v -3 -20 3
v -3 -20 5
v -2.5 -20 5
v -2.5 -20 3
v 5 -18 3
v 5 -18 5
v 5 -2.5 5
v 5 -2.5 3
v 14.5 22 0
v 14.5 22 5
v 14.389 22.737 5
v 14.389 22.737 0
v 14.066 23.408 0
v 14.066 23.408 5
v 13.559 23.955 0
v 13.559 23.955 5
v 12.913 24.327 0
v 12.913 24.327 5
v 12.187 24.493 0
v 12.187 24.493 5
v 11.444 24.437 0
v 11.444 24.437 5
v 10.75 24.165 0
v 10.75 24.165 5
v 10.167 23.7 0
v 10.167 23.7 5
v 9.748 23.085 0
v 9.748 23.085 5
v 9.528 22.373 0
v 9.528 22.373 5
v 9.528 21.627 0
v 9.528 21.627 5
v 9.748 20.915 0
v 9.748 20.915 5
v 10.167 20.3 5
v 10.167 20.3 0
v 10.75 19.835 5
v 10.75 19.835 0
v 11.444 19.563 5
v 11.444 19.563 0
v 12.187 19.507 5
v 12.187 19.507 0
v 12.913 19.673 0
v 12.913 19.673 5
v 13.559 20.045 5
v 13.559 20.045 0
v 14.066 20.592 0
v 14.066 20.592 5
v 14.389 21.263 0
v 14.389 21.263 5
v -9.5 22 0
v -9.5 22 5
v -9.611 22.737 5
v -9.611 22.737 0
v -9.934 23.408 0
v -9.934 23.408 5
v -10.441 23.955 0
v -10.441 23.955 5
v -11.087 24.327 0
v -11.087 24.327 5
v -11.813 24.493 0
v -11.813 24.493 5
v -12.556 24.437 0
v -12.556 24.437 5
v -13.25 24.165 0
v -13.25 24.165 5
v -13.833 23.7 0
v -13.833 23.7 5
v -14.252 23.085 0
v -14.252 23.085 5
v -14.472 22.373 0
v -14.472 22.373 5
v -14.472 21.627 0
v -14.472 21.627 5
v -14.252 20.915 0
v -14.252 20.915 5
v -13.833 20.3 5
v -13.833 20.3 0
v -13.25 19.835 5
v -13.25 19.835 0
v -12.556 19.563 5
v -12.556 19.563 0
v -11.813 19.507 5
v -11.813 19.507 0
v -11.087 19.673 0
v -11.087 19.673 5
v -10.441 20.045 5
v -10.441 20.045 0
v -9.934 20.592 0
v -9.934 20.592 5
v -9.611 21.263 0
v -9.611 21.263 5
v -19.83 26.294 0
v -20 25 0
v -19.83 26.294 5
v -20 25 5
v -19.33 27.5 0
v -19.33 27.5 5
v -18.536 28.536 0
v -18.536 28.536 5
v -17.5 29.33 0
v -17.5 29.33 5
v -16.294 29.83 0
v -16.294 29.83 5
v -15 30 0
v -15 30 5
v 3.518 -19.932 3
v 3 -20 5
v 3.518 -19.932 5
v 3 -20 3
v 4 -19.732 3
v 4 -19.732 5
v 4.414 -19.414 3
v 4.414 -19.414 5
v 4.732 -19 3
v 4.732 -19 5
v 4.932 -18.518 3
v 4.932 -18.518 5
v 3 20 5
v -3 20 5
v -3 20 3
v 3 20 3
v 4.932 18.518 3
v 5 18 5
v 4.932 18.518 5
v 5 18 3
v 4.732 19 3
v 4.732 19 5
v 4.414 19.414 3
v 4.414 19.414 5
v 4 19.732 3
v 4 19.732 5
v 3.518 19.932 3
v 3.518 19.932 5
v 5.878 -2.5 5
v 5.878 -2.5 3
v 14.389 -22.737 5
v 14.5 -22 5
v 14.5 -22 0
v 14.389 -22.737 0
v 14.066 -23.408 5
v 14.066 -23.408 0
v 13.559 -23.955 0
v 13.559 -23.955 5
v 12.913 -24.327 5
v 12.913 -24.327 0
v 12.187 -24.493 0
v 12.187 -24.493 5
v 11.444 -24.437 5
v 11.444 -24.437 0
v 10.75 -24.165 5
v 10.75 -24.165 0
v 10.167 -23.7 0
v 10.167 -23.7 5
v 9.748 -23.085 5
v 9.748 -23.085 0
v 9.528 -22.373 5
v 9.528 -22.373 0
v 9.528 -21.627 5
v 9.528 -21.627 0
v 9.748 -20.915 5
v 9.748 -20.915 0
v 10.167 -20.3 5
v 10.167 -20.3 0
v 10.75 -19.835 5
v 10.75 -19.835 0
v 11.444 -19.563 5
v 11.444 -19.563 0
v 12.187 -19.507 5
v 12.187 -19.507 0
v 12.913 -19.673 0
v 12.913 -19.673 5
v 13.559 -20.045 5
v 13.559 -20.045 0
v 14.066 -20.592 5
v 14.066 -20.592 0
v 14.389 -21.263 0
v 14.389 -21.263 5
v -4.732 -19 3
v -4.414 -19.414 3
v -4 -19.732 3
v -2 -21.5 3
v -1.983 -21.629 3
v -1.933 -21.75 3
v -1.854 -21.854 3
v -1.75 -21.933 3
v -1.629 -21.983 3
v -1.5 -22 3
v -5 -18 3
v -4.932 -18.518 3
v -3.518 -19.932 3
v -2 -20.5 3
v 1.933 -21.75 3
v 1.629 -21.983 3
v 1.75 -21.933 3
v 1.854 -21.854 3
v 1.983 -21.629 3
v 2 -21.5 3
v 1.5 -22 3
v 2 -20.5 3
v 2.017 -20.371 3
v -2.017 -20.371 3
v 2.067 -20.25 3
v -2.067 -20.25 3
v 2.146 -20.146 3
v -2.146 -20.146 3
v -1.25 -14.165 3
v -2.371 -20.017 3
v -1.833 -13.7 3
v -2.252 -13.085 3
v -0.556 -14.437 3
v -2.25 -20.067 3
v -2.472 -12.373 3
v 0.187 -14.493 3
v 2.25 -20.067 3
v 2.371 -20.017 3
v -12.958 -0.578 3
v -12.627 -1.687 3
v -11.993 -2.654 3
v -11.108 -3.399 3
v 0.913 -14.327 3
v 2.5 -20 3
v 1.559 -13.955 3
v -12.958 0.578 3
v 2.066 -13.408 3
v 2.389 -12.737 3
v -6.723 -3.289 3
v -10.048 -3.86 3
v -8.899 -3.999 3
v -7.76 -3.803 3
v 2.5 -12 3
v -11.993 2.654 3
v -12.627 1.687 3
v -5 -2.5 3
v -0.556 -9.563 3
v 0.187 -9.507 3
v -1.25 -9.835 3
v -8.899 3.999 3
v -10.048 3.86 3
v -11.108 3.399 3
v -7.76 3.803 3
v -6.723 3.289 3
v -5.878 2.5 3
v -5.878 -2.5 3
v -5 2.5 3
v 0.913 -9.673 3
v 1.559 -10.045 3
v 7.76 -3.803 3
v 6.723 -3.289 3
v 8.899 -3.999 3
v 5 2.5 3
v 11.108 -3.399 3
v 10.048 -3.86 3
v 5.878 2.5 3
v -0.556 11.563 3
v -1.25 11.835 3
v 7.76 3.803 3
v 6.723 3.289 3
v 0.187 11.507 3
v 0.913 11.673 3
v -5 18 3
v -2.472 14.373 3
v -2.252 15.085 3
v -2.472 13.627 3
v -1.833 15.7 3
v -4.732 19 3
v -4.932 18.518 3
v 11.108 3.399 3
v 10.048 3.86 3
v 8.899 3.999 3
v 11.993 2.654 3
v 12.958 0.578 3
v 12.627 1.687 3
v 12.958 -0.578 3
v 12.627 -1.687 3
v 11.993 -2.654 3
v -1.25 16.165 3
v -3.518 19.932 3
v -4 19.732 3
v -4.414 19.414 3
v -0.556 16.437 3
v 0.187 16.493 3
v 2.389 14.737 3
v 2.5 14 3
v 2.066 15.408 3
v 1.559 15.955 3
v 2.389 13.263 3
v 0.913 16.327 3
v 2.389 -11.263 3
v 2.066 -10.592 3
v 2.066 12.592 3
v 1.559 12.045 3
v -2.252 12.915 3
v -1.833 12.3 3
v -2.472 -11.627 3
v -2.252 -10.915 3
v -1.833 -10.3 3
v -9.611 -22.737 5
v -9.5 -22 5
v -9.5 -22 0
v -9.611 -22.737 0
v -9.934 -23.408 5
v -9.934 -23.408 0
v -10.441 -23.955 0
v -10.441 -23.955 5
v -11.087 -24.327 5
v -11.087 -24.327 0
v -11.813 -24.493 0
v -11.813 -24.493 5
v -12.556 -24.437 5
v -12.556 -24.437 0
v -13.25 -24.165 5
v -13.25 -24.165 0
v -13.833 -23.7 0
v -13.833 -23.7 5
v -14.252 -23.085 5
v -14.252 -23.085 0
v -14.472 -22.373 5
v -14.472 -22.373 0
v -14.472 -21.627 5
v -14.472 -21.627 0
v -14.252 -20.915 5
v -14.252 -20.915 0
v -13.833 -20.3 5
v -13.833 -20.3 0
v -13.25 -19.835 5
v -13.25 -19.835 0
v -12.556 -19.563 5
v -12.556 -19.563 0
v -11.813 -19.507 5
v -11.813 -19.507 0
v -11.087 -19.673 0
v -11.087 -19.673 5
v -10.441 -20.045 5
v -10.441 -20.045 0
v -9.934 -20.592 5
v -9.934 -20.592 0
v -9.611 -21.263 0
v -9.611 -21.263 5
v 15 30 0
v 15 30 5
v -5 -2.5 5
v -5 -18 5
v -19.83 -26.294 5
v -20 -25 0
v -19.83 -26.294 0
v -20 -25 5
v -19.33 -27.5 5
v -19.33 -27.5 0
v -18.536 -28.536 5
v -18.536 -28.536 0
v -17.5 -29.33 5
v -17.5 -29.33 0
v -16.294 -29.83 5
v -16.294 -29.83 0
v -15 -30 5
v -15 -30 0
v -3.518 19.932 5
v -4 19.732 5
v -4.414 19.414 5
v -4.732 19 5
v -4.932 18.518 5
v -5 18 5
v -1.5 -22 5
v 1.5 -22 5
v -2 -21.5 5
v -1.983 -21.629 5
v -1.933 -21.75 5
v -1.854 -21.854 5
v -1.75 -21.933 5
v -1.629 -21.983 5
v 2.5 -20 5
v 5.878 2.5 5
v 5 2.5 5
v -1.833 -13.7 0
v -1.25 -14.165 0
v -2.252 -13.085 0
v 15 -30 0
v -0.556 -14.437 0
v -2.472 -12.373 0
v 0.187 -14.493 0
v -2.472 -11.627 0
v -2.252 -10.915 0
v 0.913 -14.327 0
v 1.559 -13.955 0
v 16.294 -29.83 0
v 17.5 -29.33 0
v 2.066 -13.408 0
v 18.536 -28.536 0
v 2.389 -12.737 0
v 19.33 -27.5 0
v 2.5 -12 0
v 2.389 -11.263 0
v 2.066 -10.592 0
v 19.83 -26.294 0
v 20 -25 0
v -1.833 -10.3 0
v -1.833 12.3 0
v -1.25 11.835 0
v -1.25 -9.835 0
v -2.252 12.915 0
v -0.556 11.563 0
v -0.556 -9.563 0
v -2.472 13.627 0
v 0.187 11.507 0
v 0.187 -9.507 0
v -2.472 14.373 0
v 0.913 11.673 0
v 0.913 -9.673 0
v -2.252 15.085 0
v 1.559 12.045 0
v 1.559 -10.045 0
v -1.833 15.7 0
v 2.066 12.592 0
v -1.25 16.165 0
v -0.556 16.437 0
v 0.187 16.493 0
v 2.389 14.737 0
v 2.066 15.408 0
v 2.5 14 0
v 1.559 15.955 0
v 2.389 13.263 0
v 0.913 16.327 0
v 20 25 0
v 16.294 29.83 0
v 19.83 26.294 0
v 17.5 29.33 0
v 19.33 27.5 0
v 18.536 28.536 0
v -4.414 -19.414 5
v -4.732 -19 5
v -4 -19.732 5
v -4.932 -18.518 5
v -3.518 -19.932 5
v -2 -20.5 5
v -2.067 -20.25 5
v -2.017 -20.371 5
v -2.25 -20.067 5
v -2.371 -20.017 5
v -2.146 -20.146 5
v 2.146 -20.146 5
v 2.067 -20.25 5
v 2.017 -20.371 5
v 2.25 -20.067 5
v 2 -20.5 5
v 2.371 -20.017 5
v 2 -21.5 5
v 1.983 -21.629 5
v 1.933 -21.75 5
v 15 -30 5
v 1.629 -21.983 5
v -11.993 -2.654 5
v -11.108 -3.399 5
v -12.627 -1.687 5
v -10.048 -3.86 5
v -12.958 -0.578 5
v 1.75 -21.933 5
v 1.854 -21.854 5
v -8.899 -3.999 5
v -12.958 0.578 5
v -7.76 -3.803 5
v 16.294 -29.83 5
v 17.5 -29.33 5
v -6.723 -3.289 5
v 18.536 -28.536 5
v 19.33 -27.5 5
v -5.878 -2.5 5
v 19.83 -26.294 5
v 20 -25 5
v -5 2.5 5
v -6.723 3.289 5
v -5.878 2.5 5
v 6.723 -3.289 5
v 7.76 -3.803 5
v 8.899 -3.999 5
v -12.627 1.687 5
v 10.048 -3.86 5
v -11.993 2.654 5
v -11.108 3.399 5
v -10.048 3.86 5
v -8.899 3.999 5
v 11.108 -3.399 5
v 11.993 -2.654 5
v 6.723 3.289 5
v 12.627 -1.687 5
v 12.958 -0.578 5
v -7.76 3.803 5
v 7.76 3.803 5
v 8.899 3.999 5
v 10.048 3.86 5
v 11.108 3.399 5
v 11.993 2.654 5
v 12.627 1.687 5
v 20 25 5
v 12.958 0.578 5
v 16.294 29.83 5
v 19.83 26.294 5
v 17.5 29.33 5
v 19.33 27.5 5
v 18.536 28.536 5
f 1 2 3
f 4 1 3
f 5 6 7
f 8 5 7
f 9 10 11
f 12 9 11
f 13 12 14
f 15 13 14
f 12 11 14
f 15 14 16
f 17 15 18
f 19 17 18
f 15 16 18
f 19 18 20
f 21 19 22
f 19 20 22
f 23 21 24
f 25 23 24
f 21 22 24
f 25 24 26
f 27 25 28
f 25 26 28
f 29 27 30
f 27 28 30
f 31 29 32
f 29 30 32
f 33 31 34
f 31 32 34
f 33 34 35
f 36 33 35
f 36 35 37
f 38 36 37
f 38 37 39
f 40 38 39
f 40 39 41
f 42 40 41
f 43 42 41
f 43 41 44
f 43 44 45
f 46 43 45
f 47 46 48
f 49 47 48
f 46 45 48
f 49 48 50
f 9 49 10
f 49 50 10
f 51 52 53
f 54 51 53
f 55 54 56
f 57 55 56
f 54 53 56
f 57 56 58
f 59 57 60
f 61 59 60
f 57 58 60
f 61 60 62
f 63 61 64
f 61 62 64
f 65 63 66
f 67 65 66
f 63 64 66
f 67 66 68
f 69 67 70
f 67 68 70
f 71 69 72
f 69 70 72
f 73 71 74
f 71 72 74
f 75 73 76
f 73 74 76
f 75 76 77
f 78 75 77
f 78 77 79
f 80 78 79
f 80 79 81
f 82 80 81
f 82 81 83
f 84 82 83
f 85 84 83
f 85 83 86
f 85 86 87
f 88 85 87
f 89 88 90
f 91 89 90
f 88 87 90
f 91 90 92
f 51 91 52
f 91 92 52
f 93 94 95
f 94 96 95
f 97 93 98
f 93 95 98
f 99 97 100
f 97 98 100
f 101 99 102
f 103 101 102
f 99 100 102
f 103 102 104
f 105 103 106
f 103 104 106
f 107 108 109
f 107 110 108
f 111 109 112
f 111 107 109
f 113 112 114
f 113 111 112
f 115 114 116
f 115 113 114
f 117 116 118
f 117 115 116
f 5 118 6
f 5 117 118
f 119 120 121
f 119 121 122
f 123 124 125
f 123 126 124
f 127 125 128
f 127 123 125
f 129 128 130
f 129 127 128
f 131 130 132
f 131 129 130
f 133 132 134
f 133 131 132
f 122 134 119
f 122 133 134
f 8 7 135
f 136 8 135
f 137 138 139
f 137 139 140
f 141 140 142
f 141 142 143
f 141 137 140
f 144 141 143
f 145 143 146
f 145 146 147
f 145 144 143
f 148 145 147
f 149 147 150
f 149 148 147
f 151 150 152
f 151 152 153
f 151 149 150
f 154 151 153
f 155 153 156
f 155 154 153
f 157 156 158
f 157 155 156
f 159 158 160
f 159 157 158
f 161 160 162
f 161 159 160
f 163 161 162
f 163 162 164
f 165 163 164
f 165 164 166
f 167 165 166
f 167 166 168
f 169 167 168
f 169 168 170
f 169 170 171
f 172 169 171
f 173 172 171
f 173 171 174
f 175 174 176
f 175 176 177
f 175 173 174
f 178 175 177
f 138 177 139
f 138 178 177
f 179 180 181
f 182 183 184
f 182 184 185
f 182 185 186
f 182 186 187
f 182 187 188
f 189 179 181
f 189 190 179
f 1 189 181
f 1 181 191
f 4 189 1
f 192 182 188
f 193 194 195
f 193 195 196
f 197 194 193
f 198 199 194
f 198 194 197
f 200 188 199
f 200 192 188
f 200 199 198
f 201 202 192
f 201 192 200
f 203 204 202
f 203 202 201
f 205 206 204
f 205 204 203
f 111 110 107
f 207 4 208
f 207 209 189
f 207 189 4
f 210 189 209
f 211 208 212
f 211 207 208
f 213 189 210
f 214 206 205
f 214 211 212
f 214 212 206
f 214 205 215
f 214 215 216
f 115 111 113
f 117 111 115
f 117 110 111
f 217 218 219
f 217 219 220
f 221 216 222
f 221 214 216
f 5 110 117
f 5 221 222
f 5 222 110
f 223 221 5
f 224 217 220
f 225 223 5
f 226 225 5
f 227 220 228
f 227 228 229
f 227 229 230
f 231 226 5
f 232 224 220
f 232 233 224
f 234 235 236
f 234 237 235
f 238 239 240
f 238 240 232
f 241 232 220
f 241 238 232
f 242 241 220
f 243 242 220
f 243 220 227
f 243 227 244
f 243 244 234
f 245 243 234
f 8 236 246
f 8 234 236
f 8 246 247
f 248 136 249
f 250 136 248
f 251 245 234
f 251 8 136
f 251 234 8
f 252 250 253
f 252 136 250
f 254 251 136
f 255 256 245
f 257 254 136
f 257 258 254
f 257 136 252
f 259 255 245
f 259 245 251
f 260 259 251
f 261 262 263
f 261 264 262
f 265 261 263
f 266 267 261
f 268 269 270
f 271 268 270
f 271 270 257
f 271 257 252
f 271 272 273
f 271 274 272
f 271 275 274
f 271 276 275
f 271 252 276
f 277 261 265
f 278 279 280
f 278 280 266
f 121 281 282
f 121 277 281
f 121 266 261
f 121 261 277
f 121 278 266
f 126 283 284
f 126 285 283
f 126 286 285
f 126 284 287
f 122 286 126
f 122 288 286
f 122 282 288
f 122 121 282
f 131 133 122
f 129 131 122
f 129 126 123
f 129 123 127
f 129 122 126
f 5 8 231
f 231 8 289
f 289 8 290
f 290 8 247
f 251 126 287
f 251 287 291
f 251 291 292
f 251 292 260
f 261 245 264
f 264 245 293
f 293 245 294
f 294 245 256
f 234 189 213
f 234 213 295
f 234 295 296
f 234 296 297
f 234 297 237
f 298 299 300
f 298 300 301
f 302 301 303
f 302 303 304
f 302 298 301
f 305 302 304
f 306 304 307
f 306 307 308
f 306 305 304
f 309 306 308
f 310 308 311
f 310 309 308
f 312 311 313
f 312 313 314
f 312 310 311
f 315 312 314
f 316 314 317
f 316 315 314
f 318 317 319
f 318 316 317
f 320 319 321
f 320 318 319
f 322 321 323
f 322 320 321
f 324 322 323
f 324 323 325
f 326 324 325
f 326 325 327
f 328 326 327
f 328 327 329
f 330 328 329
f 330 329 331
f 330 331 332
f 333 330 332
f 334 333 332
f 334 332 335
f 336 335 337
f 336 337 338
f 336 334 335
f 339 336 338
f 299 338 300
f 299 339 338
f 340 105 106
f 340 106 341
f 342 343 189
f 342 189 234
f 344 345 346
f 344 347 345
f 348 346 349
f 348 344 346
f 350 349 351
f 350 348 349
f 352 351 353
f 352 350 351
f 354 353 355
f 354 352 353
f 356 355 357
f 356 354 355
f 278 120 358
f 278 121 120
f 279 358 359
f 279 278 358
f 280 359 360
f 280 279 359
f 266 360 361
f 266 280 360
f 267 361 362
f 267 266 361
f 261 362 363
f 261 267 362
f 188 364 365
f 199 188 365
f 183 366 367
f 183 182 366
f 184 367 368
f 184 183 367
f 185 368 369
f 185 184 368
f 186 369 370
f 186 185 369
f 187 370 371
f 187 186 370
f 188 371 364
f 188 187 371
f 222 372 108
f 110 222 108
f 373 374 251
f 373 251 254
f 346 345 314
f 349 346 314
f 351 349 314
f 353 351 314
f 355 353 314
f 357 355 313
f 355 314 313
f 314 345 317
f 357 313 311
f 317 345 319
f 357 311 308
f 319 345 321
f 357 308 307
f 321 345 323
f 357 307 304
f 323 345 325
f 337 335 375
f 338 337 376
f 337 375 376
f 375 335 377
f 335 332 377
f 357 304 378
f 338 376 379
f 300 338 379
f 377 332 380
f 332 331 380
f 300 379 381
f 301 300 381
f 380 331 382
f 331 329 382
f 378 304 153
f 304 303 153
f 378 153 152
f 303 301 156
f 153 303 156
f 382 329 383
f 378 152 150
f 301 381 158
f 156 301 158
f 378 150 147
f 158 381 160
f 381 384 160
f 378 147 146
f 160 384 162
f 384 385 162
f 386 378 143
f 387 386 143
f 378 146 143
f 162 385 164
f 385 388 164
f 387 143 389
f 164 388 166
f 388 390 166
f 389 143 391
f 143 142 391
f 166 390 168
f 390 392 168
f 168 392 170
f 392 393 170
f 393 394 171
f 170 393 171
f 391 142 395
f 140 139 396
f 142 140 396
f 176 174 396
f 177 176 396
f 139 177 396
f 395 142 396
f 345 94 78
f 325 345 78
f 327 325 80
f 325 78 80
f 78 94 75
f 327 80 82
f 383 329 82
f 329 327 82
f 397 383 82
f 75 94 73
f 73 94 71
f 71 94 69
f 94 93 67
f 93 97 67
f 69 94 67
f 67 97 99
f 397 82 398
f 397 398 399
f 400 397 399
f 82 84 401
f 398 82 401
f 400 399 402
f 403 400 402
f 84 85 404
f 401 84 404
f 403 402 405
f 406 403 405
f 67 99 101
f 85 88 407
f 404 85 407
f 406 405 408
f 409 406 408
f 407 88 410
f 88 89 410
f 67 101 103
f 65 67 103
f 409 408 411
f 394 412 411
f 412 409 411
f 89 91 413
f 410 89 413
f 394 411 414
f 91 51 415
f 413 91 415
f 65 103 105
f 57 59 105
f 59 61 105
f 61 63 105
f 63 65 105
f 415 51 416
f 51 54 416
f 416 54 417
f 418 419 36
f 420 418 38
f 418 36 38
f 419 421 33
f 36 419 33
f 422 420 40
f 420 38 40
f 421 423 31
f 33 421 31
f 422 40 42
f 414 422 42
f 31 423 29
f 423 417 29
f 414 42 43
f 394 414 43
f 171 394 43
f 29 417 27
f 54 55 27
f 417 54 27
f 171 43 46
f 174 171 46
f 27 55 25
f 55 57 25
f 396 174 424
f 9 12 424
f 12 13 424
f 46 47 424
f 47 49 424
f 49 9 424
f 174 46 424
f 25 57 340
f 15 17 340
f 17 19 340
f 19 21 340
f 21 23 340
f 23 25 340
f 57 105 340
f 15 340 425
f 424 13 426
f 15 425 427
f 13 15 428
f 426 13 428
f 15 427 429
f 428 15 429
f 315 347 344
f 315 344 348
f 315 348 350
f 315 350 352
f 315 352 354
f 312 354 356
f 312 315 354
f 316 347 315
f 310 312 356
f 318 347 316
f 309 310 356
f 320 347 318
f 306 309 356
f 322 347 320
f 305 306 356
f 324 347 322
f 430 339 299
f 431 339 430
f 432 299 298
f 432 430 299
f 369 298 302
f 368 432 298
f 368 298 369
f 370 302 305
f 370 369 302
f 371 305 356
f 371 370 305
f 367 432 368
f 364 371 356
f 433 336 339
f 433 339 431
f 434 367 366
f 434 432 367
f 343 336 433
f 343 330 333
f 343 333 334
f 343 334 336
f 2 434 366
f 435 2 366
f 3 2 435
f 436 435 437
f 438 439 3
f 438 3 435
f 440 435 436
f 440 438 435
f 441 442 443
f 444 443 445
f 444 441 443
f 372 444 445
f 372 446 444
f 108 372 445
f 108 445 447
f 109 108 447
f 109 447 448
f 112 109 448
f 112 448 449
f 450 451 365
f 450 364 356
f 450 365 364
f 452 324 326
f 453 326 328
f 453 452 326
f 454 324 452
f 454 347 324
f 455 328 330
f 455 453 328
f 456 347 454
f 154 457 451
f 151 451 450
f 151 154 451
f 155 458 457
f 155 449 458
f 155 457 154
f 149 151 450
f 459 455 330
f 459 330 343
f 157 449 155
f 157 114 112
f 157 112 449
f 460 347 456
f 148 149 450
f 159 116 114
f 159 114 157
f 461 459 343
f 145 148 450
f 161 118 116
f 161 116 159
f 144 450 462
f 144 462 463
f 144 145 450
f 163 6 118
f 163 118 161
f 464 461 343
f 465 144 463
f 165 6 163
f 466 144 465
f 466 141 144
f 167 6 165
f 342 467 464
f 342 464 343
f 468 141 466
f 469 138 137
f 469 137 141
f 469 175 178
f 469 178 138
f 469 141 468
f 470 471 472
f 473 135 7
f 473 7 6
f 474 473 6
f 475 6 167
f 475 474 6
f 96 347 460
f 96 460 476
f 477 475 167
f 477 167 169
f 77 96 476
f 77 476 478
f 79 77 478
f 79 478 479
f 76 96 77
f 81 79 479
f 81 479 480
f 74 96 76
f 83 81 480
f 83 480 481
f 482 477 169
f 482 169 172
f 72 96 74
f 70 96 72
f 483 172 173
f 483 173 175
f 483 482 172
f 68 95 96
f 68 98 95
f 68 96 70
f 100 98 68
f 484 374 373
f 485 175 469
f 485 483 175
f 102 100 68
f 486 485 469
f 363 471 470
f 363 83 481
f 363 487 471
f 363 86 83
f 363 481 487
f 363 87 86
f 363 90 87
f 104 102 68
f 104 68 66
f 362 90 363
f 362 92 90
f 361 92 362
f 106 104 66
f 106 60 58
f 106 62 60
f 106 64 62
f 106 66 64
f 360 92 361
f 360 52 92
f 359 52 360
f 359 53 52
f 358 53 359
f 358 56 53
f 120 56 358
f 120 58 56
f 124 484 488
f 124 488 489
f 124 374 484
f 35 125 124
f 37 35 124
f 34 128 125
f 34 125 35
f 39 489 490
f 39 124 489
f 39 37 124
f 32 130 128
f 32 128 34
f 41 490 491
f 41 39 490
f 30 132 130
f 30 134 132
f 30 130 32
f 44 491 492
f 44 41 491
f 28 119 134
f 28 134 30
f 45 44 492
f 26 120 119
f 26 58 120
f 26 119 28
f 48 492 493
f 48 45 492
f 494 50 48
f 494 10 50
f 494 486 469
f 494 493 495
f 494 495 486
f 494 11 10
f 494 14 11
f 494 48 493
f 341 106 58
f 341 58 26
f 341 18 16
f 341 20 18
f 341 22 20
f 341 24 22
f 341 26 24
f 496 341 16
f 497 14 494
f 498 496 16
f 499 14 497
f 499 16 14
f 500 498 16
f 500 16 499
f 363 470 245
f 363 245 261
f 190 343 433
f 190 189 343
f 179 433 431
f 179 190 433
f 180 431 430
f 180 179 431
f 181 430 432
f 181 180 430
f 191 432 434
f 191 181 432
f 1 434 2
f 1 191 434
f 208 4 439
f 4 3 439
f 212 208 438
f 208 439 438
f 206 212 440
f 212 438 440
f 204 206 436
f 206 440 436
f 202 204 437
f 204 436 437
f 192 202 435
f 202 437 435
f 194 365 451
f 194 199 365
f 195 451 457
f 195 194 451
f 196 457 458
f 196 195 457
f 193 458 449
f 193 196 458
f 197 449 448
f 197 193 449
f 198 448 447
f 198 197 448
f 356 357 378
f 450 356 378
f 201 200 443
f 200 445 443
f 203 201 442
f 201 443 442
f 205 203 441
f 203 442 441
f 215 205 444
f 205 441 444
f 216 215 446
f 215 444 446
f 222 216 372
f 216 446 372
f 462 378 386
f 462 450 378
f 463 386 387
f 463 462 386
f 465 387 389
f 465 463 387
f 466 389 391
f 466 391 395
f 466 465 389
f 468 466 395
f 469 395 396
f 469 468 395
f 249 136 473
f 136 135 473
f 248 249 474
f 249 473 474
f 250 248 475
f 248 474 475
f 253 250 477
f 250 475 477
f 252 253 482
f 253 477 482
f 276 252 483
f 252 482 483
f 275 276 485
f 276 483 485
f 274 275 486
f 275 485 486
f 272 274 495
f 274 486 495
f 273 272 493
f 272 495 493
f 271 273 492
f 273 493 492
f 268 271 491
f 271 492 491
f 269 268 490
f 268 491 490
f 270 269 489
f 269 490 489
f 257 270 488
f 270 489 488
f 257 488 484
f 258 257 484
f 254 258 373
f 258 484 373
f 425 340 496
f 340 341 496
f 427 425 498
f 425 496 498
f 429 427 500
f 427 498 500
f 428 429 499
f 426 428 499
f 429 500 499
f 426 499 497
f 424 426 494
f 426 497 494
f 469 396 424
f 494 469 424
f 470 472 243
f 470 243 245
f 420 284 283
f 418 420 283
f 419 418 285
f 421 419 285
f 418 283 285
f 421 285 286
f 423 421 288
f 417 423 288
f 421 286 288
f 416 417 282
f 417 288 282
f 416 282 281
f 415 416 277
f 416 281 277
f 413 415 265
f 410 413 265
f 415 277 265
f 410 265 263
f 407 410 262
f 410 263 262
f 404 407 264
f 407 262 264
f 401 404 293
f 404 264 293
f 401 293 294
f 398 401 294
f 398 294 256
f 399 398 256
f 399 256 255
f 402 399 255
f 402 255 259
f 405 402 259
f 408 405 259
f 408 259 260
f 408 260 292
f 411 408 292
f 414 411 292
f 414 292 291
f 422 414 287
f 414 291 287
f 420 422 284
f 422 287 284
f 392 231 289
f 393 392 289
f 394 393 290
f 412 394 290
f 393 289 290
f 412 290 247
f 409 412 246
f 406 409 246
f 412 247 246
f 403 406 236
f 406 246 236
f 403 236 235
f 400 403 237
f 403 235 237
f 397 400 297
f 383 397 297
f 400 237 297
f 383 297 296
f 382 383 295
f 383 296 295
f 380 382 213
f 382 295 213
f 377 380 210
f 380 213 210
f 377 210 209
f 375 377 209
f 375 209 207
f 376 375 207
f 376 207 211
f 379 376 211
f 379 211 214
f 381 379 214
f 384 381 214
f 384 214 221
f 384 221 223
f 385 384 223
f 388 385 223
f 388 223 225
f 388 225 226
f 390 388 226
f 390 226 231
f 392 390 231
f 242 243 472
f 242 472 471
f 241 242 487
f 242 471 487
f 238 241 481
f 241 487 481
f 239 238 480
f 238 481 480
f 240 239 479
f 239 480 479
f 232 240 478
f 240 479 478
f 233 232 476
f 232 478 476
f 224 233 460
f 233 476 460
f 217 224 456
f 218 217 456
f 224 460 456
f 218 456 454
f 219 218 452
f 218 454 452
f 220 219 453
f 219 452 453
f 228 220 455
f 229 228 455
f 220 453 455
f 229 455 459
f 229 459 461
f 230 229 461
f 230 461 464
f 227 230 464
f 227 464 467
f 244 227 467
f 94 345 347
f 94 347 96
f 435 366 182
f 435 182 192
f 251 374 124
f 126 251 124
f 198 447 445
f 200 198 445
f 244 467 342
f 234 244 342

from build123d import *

# Parameters (mm, degrees)
SKETCH_W        = 40
SKETCH_H        = 60
PAD_DEPTH       = 5
SKETCH001_W     = 10
SKETCH001_H     = 40
POCKET_DEPTH    = 2
SKETCH002_R     = 4
POCKET001_DEPTH = 2
SKETCH003_W     = 15
SKETCH003_H     = 5
POCKET002_DEPTH = 2
SKETCH004_R     = 2.5
POCKET003_DEPTH = 5
SKETCH005_W     = 4
SKETCH005_H     = 4
POCKET004_DEPTH = 2
SKETCH006_R     = 2.5
POCKET005_DEPTH = 3
FILLET_R        = 2
FILLET001_R     = 0.5
SKETCH012_R     = 2.5
POCKET008_DEPTH = 5
FILLET005_R     = 5


with BuildPart() as part:
    # Sketch → Pad (new body)
    with BuildSketch(Plane.XY):
        Rectangle(SKETCH_W, SKETCH_H)
    extrude(amount=PAD_DEPTH)

    # Sketch001 (on Face6 of Pad) → Pocket (cut)
    with BuildSketch(Plane.XY.offset(5)):
        Rectangle(SKETCH001_W, SKETCH001_H)
    extrude(amount=-POCKET_DEPTH, mode=Mode.SUBTRACT)

    # Sketch002 (on Face5 of Pocket) → Pocket001 (cut)
    with BuildSketch(Plane.XY.offset(5)):
        with Locations((9, 0)):
            Circle(SKETCH002_R)
        with Locations((-9, 0)):
            Circle(SKETCH002_R)
    extrude(amount=-POCKET001_DEPTH, mode=Mode.SUBTRACT)

    # Sketch003 (on Face5 of Pocket001) → Pocket002 (cut)
    with BuildSketch(Plane.XY.offset(5)):
        Rectangle(SKETCH003_W, SKETCH003_H)
    extrude(amount=-POCKET002_DEPTH, mode=Mode.SUBTRACT)

    # Sketch004 (on Face22 of Pocket002) → Pocket003 (cut)
    with BuildSketch(Plane.XY.offset(3)):
        with Locations((0, -12)):
            Circle(SKETCH004_R)
    extrude(amount=-POCKET003_DEPTH, mode=Mode.SUBTRACT)

    # Sketch005 (on Face5 of Pocket003) → Pocket004 (cut)
    with BuildSketch(Plane.XY.offset(5)):
        with Locations((0, -20)):
            Rectangle(SKETCH005_W, SKETCH005_H)
    extrude(amount=-POCKET004_DEPTH, mode=Mode.SUBTRACT)

    # Sketch006 (on Face31 of Pocket004) → Pocket005 (cut)
    with BuildSketch(Plane.XY.offset(3)):
        with Locations((0, 14)):
            Circle(SKETCH006_R)
    extrude(amount=-POCKET005_DEPTH, mode=Mode.SUBTRACT)

    # Fillet
    fillet_edges = [part.edges().sort_by_distance(p)[0] for p in [
        (-5, 20, 4),
        (5, 20, 4),
        (-5, -20, 4),
        (5, -20, 4),
    ]]
    fillet(fillet_edges, radius=FILLET_R)

    # Fillet001
    fillet001_edges = [part.edges().sort_by_distance(p)[0] for p in [
        (-2, -22, 4),
        (2, -22, 4),
        (2, -20, 4),
        (-2, -20, 4),
    ]]
    fillet(fillet001_edges, radius=FILLET001_R)

    # Sketch012 (on Face1 of Fillet001) → Pocket008 (cut)
    with BuildSketch(Plane.XY.offset(5)):
        with Locations((-12, 22)):
            Circle(SKETCH012_R)
        with Locations((12, 22)):
            Circle(SKETCH012_R)
    pocket008 = extrude(amount=-POCKET008_DEPTH, mode=Mode.SUBTRACT)

    # Mirrored: Pocket008 across XZ
    add(pocket008.mirror(Plane.XZ), mode=Mode.SUBTRACT)

    # Fillet005
    fillet005_edges = [part.edges().sort_by_distance(p)[0] for p in [
        (-20, -30, 2.5),
        (20, -30, 2.5),
        (-20, 30, 2.5),
        (20, 30, 2.5),
    ]]
    fillet(fillet005_edges, radius=FILLET005_R)


solid = part.part
